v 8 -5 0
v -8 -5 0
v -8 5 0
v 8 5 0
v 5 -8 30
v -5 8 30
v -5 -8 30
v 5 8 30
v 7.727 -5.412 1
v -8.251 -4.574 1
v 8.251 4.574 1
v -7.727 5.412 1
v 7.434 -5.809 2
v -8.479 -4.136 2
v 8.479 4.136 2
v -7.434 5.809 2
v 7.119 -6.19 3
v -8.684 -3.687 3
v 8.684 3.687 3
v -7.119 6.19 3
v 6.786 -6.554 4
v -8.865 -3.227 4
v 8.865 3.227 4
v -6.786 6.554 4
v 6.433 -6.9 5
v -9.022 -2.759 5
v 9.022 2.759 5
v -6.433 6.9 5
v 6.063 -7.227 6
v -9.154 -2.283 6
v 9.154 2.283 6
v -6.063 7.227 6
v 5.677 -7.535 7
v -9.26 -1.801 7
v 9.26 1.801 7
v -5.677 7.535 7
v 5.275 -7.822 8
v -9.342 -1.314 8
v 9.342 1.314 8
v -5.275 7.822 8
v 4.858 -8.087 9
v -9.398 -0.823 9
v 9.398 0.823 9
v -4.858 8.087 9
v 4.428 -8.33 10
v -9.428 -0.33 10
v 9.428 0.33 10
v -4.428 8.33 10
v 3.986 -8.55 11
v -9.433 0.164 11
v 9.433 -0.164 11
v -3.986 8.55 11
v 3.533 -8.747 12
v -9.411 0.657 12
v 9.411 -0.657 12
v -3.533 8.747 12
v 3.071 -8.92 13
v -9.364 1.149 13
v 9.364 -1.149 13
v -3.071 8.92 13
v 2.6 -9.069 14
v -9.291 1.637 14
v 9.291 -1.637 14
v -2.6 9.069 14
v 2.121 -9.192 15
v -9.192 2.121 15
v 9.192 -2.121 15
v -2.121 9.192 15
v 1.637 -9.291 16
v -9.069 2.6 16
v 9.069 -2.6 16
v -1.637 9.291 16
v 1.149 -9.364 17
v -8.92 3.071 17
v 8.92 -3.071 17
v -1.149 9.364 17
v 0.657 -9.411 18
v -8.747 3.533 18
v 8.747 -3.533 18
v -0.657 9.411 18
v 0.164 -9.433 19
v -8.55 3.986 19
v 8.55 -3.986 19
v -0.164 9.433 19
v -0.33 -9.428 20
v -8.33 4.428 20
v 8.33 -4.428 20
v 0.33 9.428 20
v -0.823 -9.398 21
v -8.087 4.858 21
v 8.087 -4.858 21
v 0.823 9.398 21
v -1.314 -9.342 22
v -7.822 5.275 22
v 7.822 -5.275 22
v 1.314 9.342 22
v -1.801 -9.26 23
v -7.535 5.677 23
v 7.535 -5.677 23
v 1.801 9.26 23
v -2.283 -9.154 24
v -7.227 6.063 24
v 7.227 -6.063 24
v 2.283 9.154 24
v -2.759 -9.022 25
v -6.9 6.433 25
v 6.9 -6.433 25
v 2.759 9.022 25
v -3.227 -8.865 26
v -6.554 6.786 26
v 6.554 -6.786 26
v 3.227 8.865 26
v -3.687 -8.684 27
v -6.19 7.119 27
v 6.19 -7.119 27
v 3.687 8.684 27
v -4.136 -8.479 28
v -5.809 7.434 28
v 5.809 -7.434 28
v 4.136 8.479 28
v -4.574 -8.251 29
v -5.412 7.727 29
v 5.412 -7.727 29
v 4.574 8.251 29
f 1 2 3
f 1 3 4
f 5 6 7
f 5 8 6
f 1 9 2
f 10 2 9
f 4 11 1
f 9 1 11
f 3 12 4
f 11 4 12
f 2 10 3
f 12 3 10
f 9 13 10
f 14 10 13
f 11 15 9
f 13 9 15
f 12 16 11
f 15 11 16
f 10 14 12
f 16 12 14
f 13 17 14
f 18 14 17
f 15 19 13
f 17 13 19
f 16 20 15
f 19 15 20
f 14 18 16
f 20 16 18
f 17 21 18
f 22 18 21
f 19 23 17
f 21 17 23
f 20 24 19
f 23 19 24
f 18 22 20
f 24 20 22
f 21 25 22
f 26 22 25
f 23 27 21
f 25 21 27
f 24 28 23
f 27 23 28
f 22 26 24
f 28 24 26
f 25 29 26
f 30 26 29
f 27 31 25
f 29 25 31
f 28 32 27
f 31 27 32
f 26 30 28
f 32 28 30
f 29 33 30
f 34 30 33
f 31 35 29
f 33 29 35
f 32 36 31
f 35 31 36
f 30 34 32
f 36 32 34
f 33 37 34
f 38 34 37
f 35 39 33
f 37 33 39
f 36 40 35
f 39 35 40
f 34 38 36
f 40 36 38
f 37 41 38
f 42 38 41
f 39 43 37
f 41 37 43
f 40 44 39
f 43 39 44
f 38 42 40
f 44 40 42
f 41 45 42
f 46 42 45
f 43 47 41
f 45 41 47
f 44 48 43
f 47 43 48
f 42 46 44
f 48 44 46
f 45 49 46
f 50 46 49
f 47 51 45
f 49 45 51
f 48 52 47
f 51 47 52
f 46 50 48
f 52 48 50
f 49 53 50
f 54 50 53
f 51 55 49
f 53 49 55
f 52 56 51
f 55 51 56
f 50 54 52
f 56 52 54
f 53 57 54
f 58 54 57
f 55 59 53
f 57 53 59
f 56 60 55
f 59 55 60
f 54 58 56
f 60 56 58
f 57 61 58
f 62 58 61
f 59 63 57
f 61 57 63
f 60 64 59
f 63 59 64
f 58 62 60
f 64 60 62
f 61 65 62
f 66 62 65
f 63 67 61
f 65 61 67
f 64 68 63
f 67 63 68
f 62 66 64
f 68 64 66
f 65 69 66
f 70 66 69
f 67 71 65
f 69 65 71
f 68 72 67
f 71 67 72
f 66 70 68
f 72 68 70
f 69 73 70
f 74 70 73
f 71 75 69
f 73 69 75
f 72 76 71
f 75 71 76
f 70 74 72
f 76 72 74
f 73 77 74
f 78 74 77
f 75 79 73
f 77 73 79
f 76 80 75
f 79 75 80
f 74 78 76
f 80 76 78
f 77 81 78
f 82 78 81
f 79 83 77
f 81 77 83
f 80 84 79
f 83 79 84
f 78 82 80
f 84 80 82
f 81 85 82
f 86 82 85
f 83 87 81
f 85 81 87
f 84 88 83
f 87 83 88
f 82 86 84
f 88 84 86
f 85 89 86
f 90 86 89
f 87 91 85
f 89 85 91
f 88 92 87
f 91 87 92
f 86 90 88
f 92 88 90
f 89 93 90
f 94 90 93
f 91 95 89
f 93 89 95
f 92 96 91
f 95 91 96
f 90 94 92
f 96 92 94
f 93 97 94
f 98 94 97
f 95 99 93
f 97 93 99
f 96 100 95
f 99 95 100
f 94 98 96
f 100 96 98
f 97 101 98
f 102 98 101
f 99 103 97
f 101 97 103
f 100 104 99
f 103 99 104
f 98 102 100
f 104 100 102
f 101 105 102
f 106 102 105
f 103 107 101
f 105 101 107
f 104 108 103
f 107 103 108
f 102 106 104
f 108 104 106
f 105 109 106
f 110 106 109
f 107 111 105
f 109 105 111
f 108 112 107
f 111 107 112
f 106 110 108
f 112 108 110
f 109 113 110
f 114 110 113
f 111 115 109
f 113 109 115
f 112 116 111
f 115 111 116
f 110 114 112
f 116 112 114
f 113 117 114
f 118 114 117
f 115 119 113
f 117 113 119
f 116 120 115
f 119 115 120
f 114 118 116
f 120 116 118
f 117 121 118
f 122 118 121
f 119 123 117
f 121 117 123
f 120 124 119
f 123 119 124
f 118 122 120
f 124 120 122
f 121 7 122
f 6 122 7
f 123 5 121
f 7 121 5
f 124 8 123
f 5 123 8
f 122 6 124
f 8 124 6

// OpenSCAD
// linear_extrude(twist=): no exact BREP form — built from the same flat slices OpenSCAD uses
linear_extrude(height = 30, twist = 90, slices = 30) square([16, 10], center = true);
